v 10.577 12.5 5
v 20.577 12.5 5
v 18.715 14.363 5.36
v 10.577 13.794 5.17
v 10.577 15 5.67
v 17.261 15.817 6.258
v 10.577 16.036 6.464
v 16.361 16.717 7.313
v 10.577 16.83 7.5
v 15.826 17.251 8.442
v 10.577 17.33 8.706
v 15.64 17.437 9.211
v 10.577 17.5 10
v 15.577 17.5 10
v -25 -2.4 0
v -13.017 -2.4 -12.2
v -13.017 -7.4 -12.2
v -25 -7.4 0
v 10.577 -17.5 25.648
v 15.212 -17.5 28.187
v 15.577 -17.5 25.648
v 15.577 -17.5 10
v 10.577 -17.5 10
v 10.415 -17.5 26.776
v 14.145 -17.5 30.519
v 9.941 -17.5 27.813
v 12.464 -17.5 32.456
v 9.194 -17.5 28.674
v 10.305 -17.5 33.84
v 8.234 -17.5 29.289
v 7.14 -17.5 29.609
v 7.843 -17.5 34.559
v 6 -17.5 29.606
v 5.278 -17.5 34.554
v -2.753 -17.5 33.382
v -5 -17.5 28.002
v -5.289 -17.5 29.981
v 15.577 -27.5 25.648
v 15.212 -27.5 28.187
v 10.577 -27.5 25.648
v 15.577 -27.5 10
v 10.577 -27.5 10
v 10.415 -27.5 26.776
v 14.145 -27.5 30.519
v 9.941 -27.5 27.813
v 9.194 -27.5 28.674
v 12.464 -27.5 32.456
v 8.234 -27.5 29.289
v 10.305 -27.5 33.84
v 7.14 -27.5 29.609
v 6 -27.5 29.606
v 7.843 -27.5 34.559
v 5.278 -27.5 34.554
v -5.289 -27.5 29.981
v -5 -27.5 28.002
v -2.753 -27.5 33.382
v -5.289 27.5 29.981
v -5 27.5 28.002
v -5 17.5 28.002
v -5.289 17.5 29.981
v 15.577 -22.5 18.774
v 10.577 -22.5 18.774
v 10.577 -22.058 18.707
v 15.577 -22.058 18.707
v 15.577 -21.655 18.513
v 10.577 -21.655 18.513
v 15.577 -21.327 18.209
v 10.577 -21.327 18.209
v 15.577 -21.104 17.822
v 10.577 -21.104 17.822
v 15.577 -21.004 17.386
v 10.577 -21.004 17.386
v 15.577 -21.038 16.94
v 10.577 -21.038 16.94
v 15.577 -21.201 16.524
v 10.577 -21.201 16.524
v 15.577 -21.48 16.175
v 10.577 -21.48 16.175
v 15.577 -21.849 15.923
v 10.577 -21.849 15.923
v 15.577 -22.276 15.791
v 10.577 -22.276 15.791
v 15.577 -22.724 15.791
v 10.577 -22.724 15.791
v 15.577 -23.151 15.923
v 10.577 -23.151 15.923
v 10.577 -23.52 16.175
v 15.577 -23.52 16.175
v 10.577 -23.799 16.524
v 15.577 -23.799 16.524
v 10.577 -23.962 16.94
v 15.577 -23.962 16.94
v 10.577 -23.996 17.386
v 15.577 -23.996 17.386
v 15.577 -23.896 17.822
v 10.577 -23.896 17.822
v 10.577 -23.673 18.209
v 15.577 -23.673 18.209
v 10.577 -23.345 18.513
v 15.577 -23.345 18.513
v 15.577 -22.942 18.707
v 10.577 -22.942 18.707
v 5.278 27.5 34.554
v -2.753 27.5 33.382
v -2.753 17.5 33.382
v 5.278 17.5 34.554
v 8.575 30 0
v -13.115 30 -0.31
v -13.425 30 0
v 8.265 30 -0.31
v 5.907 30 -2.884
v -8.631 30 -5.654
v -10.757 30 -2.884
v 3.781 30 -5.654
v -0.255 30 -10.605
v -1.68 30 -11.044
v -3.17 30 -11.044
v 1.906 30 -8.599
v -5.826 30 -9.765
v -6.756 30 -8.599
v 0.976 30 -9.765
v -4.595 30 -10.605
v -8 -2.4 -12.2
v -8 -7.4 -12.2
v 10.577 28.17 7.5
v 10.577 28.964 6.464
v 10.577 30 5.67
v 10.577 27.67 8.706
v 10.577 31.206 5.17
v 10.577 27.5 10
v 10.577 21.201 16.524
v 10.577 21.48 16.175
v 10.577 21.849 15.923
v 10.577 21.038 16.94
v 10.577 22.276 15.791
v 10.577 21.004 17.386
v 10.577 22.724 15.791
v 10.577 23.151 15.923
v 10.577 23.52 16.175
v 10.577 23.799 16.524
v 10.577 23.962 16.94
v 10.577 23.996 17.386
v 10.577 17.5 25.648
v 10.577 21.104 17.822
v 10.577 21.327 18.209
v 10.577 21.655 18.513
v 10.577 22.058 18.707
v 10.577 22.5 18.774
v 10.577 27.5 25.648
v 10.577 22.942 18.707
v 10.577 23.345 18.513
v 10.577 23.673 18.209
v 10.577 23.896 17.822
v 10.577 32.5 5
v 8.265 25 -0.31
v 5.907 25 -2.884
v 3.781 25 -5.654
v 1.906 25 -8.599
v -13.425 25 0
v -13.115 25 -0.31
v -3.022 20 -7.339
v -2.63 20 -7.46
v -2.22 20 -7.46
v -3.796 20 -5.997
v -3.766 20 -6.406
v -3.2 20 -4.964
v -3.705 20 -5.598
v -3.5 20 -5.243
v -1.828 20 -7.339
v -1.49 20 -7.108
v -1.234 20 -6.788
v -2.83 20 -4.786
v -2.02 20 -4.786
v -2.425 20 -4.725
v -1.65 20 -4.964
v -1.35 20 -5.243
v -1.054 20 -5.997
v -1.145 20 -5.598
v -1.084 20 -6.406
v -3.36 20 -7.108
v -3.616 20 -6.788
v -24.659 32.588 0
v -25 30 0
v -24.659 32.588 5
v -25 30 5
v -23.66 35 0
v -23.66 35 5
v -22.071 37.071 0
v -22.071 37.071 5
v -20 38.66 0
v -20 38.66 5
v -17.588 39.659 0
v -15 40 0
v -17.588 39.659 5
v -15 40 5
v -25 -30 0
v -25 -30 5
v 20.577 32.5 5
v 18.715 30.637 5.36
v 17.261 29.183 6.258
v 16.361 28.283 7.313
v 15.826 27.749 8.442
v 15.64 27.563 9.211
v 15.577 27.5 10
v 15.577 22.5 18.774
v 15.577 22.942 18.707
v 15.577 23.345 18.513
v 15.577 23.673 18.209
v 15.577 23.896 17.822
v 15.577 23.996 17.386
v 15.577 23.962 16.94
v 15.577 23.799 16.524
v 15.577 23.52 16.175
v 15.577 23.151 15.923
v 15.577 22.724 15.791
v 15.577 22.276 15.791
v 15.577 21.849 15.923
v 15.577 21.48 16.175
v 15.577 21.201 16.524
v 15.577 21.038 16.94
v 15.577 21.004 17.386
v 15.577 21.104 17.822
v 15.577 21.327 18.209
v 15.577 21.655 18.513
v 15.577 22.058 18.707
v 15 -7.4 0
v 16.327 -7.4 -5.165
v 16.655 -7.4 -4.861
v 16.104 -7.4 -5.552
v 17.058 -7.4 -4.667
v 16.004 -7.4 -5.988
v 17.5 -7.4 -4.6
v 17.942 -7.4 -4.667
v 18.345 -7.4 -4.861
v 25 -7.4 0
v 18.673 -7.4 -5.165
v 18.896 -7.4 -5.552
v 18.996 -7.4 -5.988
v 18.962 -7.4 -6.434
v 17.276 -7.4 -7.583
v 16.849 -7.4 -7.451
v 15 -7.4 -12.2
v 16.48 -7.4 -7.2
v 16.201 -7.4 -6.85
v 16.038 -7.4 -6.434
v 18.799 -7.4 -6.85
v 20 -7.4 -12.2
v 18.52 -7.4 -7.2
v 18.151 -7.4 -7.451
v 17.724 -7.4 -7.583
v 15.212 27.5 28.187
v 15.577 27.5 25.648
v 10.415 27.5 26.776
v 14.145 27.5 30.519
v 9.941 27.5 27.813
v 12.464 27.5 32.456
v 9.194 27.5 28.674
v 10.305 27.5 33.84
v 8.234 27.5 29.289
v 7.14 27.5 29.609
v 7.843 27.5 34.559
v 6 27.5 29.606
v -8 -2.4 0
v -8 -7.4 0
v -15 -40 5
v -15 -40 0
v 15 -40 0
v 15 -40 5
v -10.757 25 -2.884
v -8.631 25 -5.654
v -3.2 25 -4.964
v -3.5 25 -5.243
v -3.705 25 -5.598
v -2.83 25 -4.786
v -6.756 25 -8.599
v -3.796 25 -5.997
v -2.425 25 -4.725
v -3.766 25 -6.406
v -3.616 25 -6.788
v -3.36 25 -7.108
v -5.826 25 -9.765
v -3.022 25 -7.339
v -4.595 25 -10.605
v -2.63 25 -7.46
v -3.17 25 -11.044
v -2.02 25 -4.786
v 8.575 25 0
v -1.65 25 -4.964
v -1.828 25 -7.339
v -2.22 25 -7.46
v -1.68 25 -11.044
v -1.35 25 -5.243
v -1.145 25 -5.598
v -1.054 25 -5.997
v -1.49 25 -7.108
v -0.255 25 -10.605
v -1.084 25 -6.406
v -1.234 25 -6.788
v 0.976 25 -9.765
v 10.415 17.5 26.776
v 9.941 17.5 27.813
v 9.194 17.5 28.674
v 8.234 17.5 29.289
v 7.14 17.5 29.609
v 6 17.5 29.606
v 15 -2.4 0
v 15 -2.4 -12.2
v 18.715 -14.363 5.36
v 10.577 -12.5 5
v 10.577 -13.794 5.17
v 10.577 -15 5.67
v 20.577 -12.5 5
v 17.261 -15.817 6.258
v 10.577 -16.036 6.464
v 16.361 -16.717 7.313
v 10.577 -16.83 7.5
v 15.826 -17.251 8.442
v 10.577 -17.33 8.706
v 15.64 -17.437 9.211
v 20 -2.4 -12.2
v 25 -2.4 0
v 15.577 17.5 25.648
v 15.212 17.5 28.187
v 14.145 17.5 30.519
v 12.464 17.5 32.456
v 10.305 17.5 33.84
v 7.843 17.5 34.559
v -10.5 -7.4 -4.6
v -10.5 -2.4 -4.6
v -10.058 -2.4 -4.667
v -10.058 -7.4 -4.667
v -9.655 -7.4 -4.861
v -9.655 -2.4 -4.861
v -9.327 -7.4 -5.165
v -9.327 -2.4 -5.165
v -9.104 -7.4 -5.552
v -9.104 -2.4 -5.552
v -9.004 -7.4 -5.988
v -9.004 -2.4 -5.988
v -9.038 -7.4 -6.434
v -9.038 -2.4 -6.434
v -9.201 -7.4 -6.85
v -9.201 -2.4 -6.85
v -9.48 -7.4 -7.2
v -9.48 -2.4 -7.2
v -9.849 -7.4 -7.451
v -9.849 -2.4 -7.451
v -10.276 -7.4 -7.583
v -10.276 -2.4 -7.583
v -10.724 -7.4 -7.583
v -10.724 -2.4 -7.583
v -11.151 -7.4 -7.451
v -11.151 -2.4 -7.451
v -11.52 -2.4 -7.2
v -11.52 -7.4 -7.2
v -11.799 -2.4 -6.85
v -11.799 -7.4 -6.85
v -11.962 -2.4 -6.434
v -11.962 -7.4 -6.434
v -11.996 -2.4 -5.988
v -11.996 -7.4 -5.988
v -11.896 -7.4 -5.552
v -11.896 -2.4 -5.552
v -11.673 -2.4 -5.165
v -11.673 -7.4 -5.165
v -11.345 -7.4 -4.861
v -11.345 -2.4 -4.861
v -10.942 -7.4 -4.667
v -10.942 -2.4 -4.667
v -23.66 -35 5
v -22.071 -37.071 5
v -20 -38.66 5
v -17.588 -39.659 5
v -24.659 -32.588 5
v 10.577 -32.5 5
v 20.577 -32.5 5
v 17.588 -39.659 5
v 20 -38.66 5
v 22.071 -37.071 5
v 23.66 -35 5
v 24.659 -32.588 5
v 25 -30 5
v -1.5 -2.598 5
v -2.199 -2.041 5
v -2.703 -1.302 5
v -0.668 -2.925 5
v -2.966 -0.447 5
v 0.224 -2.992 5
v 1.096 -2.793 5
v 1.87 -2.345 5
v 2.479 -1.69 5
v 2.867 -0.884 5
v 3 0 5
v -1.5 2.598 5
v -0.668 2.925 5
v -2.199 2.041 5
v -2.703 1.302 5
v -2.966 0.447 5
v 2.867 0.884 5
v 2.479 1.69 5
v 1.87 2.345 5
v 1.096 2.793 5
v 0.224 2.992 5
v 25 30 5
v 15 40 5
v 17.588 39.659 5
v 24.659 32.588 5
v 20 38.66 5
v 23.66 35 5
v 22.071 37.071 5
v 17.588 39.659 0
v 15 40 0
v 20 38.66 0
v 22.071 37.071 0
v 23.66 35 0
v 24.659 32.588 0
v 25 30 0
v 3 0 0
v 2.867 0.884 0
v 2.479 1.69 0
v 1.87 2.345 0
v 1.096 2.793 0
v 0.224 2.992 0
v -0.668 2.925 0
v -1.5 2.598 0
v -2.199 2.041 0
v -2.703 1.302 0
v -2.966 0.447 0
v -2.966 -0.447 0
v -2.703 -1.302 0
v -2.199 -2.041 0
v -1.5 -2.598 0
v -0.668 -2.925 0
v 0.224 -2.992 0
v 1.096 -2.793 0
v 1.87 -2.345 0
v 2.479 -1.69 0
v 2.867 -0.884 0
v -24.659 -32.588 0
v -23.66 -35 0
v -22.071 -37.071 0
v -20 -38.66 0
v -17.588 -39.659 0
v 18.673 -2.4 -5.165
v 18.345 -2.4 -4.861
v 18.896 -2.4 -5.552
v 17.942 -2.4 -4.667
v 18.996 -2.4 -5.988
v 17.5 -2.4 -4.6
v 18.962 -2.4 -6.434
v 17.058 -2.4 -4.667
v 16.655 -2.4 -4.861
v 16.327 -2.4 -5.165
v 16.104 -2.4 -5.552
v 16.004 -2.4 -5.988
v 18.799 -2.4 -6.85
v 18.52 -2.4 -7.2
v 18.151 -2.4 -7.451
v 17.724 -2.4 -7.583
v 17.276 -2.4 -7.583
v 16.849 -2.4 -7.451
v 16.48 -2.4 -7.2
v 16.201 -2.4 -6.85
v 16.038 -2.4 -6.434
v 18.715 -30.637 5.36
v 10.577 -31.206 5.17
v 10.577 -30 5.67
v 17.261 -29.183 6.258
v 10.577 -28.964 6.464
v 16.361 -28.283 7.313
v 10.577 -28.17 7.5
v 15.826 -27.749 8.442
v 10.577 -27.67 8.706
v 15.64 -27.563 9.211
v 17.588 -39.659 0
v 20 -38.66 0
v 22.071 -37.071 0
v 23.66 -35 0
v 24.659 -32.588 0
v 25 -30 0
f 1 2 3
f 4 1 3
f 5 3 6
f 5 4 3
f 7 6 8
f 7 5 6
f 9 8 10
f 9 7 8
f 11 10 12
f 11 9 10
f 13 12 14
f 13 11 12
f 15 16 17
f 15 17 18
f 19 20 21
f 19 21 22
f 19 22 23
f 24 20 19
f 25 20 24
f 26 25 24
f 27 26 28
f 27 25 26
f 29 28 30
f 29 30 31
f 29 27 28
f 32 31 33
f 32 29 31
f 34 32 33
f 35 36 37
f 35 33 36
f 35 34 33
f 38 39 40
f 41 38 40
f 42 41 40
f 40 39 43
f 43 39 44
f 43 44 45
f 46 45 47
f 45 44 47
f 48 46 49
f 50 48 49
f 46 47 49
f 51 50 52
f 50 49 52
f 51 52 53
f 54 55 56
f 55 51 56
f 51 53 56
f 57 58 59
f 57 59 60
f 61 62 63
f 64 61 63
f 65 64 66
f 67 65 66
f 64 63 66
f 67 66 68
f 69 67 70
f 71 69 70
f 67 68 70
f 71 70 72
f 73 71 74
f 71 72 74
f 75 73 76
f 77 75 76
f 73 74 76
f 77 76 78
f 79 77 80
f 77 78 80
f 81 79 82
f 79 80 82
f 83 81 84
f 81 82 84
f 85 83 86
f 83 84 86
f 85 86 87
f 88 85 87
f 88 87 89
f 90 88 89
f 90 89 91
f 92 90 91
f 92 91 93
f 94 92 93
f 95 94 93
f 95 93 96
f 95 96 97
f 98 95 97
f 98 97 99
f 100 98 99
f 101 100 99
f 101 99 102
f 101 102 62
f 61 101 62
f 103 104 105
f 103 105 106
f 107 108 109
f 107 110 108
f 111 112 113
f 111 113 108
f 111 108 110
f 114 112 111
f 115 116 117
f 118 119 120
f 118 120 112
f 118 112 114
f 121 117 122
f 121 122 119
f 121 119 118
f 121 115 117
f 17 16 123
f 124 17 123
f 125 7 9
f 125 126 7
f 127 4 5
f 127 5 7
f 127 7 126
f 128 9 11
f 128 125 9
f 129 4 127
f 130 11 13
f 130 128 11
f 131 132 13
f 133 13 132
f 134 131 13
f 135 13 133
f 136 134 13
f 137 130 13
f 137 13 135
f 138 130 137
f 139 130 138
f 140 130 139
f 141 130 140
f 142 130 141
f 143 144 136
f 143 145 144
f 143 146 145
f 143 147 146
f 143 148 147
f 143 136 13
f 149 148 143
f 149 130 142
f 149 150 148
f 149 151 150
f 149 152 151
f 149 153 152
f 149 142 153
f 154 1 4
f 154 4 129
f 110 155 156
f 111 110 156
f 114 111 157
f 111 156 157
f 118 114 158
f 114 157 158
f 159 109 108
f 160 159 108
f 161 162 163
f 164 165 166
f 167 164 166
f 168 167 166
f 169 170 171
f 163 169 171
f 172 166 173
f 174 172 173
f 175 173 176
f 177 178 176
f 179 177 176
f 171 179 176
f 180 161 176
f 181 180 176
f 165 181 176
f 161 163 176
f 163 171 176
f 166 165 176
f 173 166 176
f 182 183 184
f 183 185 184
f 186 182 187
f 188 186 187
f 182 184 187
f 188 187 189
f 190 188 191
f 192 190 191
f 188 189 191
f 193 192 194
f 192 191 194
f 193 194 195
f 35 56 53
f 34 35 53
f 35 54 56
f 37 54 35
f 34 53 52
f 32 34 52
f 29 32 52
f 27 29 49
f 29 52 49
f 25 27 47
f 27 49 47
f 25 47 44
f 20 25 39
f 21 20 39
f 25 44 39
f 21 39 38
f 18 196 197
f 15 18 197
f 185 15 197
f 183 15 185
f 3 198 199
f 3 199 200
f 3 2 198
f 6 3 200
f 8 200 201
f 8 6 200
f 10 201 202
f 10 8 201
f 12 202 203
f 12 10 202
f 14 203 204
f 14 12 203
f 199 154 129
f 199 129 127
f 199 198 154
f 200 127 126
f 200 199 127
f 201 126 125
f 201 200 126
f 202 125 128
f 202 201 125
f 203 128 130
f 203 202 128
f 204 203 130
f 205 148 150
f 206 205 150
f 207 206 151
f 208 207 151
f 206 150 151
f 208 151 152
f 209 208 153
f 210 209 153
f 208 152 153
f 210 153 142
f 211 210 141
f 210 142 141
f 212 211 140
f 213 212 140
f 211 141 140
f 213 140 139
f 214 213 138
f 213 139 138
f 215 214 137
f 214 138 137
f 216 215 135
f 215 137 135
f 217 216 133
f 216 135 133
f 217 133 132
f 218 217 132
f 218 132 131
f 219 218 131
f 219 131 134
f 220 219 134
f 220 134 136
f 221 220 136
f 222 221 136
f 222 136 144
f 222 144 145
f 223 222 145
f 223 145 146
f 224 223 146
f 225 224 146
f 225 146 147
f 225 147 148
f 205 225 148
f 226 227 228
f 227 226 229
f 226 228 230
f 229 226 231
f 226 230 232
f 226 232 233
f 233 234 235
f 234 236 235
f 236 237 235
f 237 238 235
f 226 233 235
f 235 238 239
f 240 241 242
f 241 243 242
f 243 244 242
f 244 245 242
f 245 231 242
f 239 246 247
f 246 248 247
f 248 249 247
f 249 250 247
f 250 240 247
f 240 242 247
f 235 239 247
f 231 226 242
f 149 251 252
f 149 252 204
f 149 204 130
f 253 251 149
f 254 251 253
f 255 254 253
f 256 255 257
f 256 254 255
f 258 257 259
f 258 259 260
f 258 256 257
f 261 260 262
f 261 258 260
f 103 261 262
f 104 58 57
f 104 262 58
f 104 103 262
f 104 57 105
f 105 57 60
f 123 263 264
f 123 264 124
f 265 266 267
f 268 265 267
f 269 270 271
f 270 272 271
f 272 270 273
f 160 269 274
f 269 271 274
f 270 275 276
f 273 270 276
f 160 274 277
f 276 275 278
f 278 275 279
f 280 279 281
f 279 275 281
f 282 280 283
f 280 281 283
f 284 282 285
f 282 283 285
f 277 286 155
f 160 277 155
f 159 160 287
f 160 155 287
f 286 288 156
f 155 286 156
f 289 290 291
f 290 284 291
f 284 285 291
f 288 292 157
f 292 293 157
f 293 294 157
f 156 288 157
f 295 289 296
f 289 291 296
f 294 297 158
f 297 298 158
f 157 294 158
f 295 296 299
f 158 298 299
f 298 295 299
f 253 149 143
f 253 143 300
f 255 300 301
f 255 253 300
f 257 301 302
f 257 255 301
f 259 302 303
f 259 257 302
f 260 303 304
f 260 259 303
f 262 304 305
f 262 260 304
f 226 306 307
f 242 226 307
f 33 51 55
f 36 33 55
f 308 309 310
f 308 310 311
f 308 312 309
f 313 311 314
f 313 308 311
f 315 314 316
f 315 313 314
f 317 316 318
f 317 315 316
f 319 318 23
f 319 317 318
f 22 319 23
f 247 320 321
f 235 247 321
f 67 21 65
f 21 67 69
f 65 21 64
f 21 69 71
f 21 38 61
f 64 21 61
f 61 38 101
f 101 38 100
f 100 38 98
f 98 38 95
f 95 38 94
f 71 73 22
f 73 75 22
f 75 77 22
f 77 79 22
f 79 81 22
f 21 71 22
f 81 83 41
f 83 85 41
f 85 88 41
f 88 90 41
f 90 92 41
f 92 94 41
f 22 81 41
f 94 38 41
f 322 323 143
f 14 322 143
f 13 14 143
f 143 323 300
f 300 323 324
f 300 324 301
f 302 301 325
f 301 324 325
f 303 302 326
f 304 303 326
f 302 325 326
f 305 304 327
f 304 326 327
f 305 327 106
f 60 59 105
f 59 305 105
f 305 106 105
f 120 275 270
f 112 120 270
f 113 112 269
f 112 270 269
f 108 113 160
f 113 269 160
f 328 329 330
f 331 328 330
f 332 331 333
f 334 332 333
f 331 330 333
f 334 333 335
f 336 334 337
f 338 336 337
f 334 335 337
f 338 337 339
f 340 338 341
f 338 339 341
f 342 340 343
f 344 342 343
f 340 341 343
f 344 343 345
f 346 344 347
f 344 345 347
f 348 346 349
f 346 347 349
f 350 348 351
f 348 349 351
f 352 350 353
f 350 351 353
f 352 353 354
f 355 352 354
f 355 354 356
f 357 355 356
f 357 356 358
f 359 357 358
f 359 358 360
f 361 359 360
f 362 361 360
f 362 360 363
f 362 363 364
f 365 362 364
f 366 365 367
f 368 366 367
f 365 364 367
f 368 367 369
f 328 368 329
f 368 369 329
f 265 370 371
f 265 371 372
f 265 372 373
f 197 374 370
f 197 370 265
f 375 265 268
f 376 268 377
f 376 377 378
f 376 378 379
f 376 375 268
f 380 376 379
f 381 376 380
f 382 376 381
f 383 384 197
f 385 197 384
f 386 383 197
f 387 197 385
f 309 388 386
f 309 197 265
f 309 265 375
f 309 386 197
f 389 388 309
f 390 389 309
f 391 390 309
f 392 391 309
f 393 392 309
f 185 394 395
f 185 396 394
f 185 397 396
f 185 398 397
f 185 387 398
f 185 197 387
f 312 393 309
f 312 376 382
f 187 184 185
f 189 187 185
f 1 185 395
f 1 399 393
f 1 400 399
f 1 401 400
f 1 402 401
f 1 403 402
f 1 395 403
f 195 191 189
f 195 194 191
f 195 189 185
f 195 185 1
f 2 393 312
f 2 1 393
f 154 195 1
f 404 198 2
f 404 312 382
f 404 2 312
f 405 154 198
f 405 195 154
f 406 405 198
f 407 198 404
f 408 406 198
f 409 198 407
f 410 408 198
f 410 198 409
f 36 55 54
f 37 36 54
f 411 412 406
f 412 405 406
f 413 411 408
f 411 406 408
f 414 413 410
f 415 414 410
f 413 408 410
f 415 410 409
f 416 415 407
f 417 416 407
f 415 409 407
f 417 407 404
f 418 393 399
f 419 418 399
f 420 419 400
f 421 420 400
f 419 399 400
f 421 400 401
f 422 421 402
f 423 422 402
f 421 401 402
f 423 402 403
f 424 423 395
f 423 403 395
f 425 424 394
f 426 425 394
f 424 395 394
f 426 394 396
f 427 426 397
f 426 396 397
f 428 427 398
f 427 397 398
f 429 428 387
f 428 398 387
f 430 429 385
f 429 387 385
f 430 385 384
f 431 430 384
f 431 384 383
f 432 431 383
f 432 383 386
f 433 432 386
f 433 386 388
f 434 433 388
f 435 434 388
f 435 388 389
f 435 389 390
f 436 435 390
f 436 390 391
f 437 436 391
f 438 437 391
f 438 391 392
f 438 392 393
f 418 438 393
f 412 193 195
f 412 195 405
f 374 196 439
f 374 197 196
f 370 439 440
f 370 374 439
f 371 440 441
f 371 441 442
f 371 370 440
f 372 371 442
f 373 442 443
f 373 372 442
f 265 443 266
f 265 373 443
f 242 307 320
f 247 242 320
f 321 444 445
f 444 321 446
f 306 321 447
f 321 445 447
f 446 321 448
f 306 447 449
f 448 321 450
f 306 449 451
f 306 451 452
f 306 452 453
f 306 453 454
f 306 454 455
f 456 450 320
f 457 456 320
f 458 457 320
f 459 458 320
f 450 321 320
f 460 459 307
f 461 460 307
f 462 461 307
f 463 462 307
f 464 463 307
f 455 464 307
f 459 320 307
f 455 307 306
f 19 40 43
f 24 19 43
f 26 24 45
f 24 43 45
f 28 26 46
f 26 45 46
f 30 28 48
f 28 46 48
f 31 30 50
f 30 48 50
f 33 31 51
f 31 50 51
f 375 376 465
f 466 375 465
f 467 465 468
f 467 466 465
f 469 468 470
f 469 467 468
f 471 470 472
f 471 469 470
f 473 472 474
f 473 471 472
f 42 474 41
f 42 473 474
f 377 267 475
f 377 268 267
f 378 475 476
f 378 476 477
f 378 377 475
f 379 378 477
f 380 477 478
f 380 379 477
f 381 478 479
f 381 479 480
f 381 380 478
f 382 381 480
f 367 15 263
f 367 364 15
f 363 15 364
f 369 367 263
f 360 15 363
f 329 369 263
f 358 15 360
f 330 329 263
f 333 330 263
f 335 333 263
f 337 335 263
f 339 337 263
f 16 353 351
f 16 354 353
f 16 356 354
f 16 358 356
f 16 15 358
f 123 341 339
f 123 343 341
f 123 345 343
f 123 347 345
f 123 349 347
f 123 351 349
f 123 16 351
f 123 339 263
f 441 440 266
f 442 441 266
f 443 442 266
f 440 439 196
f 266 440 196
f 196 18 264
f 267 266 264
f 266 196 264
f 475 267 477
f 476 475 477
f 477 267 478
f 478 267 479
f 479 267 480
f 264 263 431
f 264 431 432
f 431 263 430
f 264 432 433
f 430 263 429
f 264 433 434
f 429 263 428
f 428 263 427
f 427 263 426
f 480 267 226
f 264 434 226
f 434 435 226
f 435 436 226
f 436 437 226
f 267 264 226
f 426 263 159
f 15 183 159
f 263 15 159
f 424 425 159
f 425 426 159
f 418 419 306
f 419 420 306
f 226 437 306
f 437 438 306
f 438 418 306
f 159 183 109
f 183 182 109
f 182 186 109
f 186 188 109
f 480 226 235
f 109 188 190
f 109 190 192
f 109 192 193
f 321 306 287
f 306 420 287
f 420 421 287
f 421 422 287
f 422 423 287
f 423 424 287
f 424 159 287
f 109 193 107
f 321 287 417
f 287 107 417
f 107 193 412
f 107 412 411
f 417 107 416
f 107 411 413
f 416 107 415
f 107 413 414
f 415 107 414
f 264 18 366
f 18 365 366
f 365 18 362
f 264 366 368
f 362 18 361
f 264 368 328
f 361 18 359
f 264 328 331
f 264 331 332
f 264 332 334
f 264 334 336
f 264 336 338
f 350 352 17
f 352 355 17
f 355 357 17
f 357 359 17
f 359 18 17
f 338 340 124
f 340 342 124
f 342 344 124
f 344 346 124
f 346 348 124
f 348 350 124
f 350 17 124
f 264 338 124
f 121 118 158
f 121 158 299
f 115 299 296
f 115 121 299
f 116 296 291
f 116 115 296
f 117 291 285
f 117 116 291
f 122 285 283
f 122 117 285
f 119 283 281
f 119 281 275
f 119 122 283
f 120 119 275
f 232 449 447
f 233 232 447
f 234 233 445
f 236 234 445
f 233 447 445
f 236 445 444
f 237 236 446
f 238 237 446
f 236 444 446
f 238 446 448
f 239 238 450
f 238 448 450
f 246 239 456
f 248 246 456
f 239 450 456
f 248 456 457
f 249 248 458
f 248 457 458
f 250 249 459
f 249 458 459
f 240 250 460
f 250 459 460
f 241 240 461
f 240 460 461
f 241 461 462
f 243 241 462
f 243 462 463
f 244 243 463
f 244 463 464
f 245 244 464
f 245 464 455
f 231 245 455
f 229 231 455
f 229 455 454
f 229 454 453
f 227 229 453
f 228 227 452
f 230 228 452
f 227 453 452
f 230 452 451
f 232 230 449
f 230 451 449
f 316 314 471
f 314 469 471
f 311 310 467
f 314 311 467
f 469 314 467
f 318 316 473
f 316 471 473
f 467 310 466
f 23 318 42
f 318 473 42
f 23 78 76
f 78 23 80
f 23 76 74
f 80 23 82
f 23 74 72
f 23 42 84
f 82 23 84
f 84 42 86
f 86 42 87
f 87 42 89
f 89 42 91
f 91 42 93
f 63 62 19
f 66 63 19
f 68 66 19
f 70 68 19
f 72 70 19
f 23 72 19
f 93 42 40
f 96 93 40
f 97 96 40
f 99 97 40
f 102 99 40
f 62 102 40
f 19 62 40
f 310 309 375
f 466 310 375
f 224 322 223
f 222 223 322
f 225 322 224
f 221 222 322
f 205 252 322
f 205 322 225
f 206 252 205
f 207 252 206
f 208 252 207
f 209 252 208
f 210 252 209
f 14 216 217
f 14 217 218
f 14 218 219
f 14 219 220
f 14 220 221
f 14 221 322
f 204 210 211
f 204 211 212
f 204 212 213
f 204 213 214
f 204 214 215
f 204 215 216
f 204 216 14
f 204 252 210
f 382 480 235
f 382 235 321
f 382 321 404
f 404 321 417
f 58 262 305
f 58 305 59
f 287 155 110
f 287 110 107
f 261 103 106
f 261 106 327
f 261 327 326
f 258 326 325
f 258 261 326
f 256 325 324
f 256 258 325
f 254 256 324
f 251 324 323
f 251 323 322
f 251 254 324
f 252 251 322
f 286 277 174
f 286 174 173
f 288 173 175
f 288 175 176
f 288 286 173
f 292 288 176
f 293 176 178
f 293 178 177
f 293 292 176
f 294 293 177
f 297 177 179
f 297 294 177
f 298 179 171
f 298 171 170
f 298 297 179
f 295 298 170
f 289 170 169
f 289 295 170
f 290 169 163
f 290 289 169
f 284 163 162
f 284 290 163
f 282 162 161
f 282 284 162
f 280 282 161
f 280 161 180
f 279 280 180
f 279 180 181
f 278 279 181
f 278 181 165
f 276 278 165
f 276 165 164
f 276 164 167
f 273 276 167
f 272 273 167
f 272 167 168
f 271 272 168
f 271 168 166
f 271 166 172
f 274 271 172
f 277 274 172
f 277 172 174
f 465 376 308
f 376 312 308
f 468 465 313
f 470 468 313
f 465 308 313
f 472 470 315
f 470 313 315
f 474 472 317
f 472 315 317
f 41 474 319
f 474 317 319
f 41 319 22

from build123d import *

# Parameters (mm, degrees)
ESQUISSE1_W             = 50
ESQUISSE1_H             = 80
BOSS_EXTRU_1_DEPTH      = 5
BOSS_EXTRU_2_START      = -42.4
ESQUISSE2_W             = 5
ESQUISSE2_H             = 12.2
ESQUISSE2_R             = 1.5
ESQUISSE2_W_2           = 5.01688185
BOSS_EXTRU_2_DEPTH      = 5
ESQUISSE3_R             = 3
ENL_V_MAT_EXTRU_1_DEPTH = 51.207967495
BOSS_EXTRU_3_START      = -10
ESQUISSE5_R             = 1.375
BOSS_EXTRU_3_DEPTH      = 5
ESQUISSE6_R             = 1.375
BOSS_EXTRU_4_DEPTH      = 10
BOSS_EXTRU_5_START      = -12.5
BOSS_EXTRU_5_DEPTH      = 10
CONG_1_R                = 5
CONG_2_R                = 5
CONG_3_R                = 5
CONG_1_OF_SYM_TRIE1_R   = 5
CONG_2_OF_SYM_TRIE1_R   = 5
CONG_3_OF_SYM_TRIE1_R   = 5
CHANFREIN1_SIZE         = 3
BOSS_EXTRU_6_DEPTH      = 5
ESQUISSE10_R            = 1.5
ENL_V_MAT_EXTRU_2_DEPTH = 64.767186518
CONG_4_R                = 10
CHANFREIN5_START        = -9.492908537
CHANFREIN5_OUTLINE_W    = 12
CHANFREIN5_OUTLINE_H    = 5
CHANFREIN5_DEPTH        = 4.242640687
CHANFREIN6_START        = 1.820799962
CHANFREIN6_OUTLINE_W    = 12
CHANFREIN6_OUTLINE_H    = 5
CHANFREIN6_DEPTH        = 4.242640687
CONG_5_START            = 25
CONG_5_DEPTH            = 5
CONG_6_START            = 25
CONG_6_DEPTH            = 5


with BuildPart() as part:
    # Esquisse1 → Boss.-Extru.1 (new body)
    with BuildSketch(Plane.XY):
        Rectangle(ESQUISSE1_W, ESQUISSE1_H)
    extrude(amount=BOSS_EXTRU_1_DEPTH)

    # Esquisse2 → Boss.-Extru.2 (add)
    # profile 1 of 2: a face of its own
    with BuildSketch(Plane(origin=(0, 40, 0), x_dir=(1, 0, 0), z_dir=(0, 1, 0)).offset(BOSS_EXTRU_2_START)):
        with Locations((17.5, 6.1)):
            Rectangle(ESQUISSE2_W, ESQUISSE2_H)
        with Locations(Location((17.5, 6.1, 0), (0, 0, 270))):
            Circle(ESQUISSE2_R, mode=Mode.SUBTRACT)
    # profile 2 of 2: a face of its own
    with BuildSketch(Plane(origin=(0, 40, 0), x_dir=(1, 0, 0), z_dir=(0, 1, 0)).offset(BOSS_EXTRU_2_START)):
        with Locations((-10.508440925, 6.1)):
            Rectangle(ESQUISSE2_W_2, ESQUISSE2_H)
        with Locations(Location((-10.5, 6.1, 0), (0, 0, 270))):
            Circle(ESQUISSE2_R, mode=Mode.SUBTRACT)
    extrude(amount=-BOSS_EXTRU_2_DEPTH)

    # Esquisse3 → Enlèv. mat.-Extru.1 (cut, through all)
    with BuildSketch(Plane.XY.offset(5)):
        Circle(ESQUISSE3_R)
    extrude(amount=-ENL_V_MAT_EXTRU_1_DEPTH, mode=Mode.SUBTRACT)

    # Esquisse5 → Boss.-Extru.3 (add)
    with BuildSketch(Plane(origin=(0, 40, 0), x_dir=(1, 0, 0), z_dir=(0, 1, 0)).offset(BOSS_EXTRU_3_START)):
        with BuildLine():
            Line((-7.425, 6.1), (-7.425, 0))
            Line((-7.425, 0), (2.575, 0))
            Line((2.575, 0), (2.575, 6.1))
            ThreePointArc((2.575, 6.1), (-2.425, 11.1), (-7.425, 6.1))
        make_face()
        with Locations(Location((-2.425, 6.1, 0), (0, 0, 270))):
            Circle(ESQUISSE5_R, mode=Mode.SUBTRACT)
    extrude(amount=-BOSS_EXTRU_3_DEPTH)

    # Esquisse6 → Boss.-Extru.4 (add)
    with BuildSketch(Plane(origin=(0, 30, 0), x_dir=(1, 0, 0), z_dir=(0, 1, 0))):
        with Locations(Location((-2.425, 6.1, 0), (0, 0, 270))):
            Circle(ESQUISSE6_R)
    extrude(amount=-BOSS_EXTRU_4_DEPTH)

    # Esquisse7 → Boss.-Extru.5 (add)
    with BuildSketch(Plane.XZ.offset(40).offset(BOSS_EXTRU_5_START)):
        with BuildLine():
            Line((10.577424804, 5), (10.577424804, 25.648245565))
            ThreePointArc((10.577424804, 25.648245565), (9.193748636, 28.673943766), (6, 29.606348721))
            Line((6, 29.606348721), (-5, 28.001622266))
            Line((-5, 28.001622266), (-5.721781005, 32.949251212))
            Line((-5.721781005, 32.949251212), (5.278218995, 34.553977666))
            ThreePointArc((5.278218995, 34.553977666), (12.464153425, 32.456066518), (15.577424804, 25.648245565))
            Line((15.577424804, 25.648245565), (15.577424804, 5))
            Line((15.577424804, 5), (10.577424804, 5))
        make_face()
    boss_extru_5 = extrude(amount=-BOSS_EXTRU_5_DEPTH)

    # Congé1
    cong_1_edges = [part.edges().sort_by_distance(p)[0] for p in [
        (15.577424804, -22.5, 5),
    ]]
    fillet(cong_1_edges, radius=CONG_1_R)

    # Congé2
    cong_2_edges = [part.edges().sort_by_distance(p)[0] for p in [
        (15.577424804, -17.5, 5),
    ]]
    fillet(cong_2_edges, radius=CONG_2_R)

    # Congé3
    cong_3_edges = [part.edges().sort_by_distance(p)[0] for p in [
        (15.577424804, -27.5, 5),
    ]]
    fillet(cong_3_edges, radius=CONG_3_R)

    # Symétrie1: Boss.-Extru.5 across plane
    add(boss_extru_5.mirror(Plane.ZX))

    # Congé1 of Symétrie1
    cong_1_of_sym_trie1_edges = [part.edges().sort_by_distance(p)[0] for p in [
        (15.577424804, 22.5, 5),
    ]]
    fillet(cong_1_of_sym_trie1_edges, radius=CONG_1_OF_SYM_TRIE1_R)

    # Congé2 of Symétrie1
    cong_2_of_sym_trie1_edges = [part.edges().sort_by_distance(p)[0] for p in [
        (15.577424804, 17.5, 5),
    ]]
    fillet(cong_2_of_sym_trie1_edges, radius=CONG_2_OF_SYM_TRIE1_R)

    # Congé3 of Symétrie1
    cong_3_of_sym_trie1_edges = [part.edges().sort_by_distance(p)[0] for p in [
        (15.577424804, 27.5, 5),
    ]]
    fillet(cong_3_of_sym_trie1_edges, radius=CONG_3_OF_SYM_TRIE1_R)

    # Chanfrein1
    chanfrein1_edges = [part.edges().sort_by_distance(p)[0] for p in [
        (-5.721781005, 22.5, 32.949251212),
        (-5.721781005, -22.5, 32.949251212),
    ]]
    chamfer(chanfrein1_edges, length=CHANFREIN1_SIZE)

    # Esquisse9 → Boss.-Extru.6 (add)
    with BuildSketch(Plane(origin=(0, -2.4, 0), x_dir=(1, 0, 0), z_dir=(0, 1, 0))):
        Polygon((-13.01688185, 12.2), (-25, 0), (-13.01688185, 0), align=None)
        Polygon((20, 12.2), (25, 0), (20, 0), align=None)
    extrude(amount=-BOSS_EXTRU_6_DEPTH)

    # Esquisse10 → Enlèv. mat.-Extru.2 (cut, through all)
    with BuildSketch(Plane.ZY.offset(-10.577424804)):
        with Locations((17.274122782, -22.5)):
            Circle(ESQUISSE10_R)
        with Locations((17.274122782, 22.5)):
            Circle(ESQUISSE10_R)
    extrude(amount=-ENL_V_MAT_EXTRU_2_DEPTH, mode=Mode.SUBTRACT)

    # Congé4
    cong_4_edges = [part.edges().sort_by_distance(p)[0] for p in [
        (25, -40, 2.5),
        (-25, -40, 2.5),
        (-25, 40, 2.5),
        (25, 40, 2.5),
    ]]
    fillet(cong_4_edges, radius=CONG_4_R)

    # Chanfrein5: read off the stored shape, not the designer's step
    # Chanfrein5 outline → Chanfrein5 (add)
    with BuildSketch(Plane(origin=(0, 0, 0), x_dir=(0.707106781186548, 0, -0.707106781186547), z_dir=(0.707106781186547, 0, 0.707106781186548)).offset(CHANFREIN5_START)):
        with Locations((-5, 27.5)):
            Rectangle(CHANFREIN5_OUTLINE_W, CHANFREIN5_OUTLINE_H)
    extrude(amount=CHANFREIN5_DEPTH)

    # Chanfrein6: read off the stored shape, not the designer's step
    # Chanfrein6 outline → Chanfrein6 (add)
    with BuildSketch(Plane(origin=(0, 0, 0), x_dir=(0.707106781186548, 0, 0.707106781186547), z_dir=(0.707106781186547, 0, -0.707106781186548)).offset(CHANFREIN6_START)):
        with Locations((2, -27.5)):
            Rectangle(CHANFREIN6_OUTLINE_W, CHANFREIN6_OUTLINE_H)
    extrude(amount=CHANFREIN6_DEPTH)

    # Congé5: read off the stored shape, not the designer's step
    # Congé5 outline → Congé5 (add)
    with BuildSketch(Plane(origin=(0, 0, 0), x_dir=(1, 0, 0), z_dir=(0, 1, 0)).offset(CONG_5_START)):
        with BuildLine():
            ThreePointArc((-6.755521581, 8.599316474), (-9.663638899, 4.245895741), (-13.11542298, 0.30957702))
            Line((-13.11542298, 0.30957702), (-7.425, 6))
            Line((-7.425, 6), (-7.425, 6.1))
            ThreePointArc((-7.425, 6.1), (-7.254731251, 7.393714052), (-6.755521581, 8.599316474))
        make_face()
    extrude(amount=CONG_5_DEPTH)

    # Congé6: read off the stored shape, not the designer's step
    # Congé6 outline → Congé6 (add)
    with BuildSketch(Plane(origin=(0, 0, 0), x_dir=(1, 0, 0), z_dir=(0, 1, 0)).offset(CONG_6_START)):
        with BuildLine():
            ThreePointArc((8.26542298, 0.30957702), (4.813638899, 4.245895741), (1.905521581, 8.599316474))
            ThreePointArc((1.905521581, 8.599316474), (2.40473125, 7.393714052), (2.575, 6.1))
            Line((2.575, 6.1), (2.575, 6))
            Line((2.575, 6), (8.26542298, 0.30957702))
        make_face()
    extrude(amount=CONG_6_DEPTH)


solid = part.part
